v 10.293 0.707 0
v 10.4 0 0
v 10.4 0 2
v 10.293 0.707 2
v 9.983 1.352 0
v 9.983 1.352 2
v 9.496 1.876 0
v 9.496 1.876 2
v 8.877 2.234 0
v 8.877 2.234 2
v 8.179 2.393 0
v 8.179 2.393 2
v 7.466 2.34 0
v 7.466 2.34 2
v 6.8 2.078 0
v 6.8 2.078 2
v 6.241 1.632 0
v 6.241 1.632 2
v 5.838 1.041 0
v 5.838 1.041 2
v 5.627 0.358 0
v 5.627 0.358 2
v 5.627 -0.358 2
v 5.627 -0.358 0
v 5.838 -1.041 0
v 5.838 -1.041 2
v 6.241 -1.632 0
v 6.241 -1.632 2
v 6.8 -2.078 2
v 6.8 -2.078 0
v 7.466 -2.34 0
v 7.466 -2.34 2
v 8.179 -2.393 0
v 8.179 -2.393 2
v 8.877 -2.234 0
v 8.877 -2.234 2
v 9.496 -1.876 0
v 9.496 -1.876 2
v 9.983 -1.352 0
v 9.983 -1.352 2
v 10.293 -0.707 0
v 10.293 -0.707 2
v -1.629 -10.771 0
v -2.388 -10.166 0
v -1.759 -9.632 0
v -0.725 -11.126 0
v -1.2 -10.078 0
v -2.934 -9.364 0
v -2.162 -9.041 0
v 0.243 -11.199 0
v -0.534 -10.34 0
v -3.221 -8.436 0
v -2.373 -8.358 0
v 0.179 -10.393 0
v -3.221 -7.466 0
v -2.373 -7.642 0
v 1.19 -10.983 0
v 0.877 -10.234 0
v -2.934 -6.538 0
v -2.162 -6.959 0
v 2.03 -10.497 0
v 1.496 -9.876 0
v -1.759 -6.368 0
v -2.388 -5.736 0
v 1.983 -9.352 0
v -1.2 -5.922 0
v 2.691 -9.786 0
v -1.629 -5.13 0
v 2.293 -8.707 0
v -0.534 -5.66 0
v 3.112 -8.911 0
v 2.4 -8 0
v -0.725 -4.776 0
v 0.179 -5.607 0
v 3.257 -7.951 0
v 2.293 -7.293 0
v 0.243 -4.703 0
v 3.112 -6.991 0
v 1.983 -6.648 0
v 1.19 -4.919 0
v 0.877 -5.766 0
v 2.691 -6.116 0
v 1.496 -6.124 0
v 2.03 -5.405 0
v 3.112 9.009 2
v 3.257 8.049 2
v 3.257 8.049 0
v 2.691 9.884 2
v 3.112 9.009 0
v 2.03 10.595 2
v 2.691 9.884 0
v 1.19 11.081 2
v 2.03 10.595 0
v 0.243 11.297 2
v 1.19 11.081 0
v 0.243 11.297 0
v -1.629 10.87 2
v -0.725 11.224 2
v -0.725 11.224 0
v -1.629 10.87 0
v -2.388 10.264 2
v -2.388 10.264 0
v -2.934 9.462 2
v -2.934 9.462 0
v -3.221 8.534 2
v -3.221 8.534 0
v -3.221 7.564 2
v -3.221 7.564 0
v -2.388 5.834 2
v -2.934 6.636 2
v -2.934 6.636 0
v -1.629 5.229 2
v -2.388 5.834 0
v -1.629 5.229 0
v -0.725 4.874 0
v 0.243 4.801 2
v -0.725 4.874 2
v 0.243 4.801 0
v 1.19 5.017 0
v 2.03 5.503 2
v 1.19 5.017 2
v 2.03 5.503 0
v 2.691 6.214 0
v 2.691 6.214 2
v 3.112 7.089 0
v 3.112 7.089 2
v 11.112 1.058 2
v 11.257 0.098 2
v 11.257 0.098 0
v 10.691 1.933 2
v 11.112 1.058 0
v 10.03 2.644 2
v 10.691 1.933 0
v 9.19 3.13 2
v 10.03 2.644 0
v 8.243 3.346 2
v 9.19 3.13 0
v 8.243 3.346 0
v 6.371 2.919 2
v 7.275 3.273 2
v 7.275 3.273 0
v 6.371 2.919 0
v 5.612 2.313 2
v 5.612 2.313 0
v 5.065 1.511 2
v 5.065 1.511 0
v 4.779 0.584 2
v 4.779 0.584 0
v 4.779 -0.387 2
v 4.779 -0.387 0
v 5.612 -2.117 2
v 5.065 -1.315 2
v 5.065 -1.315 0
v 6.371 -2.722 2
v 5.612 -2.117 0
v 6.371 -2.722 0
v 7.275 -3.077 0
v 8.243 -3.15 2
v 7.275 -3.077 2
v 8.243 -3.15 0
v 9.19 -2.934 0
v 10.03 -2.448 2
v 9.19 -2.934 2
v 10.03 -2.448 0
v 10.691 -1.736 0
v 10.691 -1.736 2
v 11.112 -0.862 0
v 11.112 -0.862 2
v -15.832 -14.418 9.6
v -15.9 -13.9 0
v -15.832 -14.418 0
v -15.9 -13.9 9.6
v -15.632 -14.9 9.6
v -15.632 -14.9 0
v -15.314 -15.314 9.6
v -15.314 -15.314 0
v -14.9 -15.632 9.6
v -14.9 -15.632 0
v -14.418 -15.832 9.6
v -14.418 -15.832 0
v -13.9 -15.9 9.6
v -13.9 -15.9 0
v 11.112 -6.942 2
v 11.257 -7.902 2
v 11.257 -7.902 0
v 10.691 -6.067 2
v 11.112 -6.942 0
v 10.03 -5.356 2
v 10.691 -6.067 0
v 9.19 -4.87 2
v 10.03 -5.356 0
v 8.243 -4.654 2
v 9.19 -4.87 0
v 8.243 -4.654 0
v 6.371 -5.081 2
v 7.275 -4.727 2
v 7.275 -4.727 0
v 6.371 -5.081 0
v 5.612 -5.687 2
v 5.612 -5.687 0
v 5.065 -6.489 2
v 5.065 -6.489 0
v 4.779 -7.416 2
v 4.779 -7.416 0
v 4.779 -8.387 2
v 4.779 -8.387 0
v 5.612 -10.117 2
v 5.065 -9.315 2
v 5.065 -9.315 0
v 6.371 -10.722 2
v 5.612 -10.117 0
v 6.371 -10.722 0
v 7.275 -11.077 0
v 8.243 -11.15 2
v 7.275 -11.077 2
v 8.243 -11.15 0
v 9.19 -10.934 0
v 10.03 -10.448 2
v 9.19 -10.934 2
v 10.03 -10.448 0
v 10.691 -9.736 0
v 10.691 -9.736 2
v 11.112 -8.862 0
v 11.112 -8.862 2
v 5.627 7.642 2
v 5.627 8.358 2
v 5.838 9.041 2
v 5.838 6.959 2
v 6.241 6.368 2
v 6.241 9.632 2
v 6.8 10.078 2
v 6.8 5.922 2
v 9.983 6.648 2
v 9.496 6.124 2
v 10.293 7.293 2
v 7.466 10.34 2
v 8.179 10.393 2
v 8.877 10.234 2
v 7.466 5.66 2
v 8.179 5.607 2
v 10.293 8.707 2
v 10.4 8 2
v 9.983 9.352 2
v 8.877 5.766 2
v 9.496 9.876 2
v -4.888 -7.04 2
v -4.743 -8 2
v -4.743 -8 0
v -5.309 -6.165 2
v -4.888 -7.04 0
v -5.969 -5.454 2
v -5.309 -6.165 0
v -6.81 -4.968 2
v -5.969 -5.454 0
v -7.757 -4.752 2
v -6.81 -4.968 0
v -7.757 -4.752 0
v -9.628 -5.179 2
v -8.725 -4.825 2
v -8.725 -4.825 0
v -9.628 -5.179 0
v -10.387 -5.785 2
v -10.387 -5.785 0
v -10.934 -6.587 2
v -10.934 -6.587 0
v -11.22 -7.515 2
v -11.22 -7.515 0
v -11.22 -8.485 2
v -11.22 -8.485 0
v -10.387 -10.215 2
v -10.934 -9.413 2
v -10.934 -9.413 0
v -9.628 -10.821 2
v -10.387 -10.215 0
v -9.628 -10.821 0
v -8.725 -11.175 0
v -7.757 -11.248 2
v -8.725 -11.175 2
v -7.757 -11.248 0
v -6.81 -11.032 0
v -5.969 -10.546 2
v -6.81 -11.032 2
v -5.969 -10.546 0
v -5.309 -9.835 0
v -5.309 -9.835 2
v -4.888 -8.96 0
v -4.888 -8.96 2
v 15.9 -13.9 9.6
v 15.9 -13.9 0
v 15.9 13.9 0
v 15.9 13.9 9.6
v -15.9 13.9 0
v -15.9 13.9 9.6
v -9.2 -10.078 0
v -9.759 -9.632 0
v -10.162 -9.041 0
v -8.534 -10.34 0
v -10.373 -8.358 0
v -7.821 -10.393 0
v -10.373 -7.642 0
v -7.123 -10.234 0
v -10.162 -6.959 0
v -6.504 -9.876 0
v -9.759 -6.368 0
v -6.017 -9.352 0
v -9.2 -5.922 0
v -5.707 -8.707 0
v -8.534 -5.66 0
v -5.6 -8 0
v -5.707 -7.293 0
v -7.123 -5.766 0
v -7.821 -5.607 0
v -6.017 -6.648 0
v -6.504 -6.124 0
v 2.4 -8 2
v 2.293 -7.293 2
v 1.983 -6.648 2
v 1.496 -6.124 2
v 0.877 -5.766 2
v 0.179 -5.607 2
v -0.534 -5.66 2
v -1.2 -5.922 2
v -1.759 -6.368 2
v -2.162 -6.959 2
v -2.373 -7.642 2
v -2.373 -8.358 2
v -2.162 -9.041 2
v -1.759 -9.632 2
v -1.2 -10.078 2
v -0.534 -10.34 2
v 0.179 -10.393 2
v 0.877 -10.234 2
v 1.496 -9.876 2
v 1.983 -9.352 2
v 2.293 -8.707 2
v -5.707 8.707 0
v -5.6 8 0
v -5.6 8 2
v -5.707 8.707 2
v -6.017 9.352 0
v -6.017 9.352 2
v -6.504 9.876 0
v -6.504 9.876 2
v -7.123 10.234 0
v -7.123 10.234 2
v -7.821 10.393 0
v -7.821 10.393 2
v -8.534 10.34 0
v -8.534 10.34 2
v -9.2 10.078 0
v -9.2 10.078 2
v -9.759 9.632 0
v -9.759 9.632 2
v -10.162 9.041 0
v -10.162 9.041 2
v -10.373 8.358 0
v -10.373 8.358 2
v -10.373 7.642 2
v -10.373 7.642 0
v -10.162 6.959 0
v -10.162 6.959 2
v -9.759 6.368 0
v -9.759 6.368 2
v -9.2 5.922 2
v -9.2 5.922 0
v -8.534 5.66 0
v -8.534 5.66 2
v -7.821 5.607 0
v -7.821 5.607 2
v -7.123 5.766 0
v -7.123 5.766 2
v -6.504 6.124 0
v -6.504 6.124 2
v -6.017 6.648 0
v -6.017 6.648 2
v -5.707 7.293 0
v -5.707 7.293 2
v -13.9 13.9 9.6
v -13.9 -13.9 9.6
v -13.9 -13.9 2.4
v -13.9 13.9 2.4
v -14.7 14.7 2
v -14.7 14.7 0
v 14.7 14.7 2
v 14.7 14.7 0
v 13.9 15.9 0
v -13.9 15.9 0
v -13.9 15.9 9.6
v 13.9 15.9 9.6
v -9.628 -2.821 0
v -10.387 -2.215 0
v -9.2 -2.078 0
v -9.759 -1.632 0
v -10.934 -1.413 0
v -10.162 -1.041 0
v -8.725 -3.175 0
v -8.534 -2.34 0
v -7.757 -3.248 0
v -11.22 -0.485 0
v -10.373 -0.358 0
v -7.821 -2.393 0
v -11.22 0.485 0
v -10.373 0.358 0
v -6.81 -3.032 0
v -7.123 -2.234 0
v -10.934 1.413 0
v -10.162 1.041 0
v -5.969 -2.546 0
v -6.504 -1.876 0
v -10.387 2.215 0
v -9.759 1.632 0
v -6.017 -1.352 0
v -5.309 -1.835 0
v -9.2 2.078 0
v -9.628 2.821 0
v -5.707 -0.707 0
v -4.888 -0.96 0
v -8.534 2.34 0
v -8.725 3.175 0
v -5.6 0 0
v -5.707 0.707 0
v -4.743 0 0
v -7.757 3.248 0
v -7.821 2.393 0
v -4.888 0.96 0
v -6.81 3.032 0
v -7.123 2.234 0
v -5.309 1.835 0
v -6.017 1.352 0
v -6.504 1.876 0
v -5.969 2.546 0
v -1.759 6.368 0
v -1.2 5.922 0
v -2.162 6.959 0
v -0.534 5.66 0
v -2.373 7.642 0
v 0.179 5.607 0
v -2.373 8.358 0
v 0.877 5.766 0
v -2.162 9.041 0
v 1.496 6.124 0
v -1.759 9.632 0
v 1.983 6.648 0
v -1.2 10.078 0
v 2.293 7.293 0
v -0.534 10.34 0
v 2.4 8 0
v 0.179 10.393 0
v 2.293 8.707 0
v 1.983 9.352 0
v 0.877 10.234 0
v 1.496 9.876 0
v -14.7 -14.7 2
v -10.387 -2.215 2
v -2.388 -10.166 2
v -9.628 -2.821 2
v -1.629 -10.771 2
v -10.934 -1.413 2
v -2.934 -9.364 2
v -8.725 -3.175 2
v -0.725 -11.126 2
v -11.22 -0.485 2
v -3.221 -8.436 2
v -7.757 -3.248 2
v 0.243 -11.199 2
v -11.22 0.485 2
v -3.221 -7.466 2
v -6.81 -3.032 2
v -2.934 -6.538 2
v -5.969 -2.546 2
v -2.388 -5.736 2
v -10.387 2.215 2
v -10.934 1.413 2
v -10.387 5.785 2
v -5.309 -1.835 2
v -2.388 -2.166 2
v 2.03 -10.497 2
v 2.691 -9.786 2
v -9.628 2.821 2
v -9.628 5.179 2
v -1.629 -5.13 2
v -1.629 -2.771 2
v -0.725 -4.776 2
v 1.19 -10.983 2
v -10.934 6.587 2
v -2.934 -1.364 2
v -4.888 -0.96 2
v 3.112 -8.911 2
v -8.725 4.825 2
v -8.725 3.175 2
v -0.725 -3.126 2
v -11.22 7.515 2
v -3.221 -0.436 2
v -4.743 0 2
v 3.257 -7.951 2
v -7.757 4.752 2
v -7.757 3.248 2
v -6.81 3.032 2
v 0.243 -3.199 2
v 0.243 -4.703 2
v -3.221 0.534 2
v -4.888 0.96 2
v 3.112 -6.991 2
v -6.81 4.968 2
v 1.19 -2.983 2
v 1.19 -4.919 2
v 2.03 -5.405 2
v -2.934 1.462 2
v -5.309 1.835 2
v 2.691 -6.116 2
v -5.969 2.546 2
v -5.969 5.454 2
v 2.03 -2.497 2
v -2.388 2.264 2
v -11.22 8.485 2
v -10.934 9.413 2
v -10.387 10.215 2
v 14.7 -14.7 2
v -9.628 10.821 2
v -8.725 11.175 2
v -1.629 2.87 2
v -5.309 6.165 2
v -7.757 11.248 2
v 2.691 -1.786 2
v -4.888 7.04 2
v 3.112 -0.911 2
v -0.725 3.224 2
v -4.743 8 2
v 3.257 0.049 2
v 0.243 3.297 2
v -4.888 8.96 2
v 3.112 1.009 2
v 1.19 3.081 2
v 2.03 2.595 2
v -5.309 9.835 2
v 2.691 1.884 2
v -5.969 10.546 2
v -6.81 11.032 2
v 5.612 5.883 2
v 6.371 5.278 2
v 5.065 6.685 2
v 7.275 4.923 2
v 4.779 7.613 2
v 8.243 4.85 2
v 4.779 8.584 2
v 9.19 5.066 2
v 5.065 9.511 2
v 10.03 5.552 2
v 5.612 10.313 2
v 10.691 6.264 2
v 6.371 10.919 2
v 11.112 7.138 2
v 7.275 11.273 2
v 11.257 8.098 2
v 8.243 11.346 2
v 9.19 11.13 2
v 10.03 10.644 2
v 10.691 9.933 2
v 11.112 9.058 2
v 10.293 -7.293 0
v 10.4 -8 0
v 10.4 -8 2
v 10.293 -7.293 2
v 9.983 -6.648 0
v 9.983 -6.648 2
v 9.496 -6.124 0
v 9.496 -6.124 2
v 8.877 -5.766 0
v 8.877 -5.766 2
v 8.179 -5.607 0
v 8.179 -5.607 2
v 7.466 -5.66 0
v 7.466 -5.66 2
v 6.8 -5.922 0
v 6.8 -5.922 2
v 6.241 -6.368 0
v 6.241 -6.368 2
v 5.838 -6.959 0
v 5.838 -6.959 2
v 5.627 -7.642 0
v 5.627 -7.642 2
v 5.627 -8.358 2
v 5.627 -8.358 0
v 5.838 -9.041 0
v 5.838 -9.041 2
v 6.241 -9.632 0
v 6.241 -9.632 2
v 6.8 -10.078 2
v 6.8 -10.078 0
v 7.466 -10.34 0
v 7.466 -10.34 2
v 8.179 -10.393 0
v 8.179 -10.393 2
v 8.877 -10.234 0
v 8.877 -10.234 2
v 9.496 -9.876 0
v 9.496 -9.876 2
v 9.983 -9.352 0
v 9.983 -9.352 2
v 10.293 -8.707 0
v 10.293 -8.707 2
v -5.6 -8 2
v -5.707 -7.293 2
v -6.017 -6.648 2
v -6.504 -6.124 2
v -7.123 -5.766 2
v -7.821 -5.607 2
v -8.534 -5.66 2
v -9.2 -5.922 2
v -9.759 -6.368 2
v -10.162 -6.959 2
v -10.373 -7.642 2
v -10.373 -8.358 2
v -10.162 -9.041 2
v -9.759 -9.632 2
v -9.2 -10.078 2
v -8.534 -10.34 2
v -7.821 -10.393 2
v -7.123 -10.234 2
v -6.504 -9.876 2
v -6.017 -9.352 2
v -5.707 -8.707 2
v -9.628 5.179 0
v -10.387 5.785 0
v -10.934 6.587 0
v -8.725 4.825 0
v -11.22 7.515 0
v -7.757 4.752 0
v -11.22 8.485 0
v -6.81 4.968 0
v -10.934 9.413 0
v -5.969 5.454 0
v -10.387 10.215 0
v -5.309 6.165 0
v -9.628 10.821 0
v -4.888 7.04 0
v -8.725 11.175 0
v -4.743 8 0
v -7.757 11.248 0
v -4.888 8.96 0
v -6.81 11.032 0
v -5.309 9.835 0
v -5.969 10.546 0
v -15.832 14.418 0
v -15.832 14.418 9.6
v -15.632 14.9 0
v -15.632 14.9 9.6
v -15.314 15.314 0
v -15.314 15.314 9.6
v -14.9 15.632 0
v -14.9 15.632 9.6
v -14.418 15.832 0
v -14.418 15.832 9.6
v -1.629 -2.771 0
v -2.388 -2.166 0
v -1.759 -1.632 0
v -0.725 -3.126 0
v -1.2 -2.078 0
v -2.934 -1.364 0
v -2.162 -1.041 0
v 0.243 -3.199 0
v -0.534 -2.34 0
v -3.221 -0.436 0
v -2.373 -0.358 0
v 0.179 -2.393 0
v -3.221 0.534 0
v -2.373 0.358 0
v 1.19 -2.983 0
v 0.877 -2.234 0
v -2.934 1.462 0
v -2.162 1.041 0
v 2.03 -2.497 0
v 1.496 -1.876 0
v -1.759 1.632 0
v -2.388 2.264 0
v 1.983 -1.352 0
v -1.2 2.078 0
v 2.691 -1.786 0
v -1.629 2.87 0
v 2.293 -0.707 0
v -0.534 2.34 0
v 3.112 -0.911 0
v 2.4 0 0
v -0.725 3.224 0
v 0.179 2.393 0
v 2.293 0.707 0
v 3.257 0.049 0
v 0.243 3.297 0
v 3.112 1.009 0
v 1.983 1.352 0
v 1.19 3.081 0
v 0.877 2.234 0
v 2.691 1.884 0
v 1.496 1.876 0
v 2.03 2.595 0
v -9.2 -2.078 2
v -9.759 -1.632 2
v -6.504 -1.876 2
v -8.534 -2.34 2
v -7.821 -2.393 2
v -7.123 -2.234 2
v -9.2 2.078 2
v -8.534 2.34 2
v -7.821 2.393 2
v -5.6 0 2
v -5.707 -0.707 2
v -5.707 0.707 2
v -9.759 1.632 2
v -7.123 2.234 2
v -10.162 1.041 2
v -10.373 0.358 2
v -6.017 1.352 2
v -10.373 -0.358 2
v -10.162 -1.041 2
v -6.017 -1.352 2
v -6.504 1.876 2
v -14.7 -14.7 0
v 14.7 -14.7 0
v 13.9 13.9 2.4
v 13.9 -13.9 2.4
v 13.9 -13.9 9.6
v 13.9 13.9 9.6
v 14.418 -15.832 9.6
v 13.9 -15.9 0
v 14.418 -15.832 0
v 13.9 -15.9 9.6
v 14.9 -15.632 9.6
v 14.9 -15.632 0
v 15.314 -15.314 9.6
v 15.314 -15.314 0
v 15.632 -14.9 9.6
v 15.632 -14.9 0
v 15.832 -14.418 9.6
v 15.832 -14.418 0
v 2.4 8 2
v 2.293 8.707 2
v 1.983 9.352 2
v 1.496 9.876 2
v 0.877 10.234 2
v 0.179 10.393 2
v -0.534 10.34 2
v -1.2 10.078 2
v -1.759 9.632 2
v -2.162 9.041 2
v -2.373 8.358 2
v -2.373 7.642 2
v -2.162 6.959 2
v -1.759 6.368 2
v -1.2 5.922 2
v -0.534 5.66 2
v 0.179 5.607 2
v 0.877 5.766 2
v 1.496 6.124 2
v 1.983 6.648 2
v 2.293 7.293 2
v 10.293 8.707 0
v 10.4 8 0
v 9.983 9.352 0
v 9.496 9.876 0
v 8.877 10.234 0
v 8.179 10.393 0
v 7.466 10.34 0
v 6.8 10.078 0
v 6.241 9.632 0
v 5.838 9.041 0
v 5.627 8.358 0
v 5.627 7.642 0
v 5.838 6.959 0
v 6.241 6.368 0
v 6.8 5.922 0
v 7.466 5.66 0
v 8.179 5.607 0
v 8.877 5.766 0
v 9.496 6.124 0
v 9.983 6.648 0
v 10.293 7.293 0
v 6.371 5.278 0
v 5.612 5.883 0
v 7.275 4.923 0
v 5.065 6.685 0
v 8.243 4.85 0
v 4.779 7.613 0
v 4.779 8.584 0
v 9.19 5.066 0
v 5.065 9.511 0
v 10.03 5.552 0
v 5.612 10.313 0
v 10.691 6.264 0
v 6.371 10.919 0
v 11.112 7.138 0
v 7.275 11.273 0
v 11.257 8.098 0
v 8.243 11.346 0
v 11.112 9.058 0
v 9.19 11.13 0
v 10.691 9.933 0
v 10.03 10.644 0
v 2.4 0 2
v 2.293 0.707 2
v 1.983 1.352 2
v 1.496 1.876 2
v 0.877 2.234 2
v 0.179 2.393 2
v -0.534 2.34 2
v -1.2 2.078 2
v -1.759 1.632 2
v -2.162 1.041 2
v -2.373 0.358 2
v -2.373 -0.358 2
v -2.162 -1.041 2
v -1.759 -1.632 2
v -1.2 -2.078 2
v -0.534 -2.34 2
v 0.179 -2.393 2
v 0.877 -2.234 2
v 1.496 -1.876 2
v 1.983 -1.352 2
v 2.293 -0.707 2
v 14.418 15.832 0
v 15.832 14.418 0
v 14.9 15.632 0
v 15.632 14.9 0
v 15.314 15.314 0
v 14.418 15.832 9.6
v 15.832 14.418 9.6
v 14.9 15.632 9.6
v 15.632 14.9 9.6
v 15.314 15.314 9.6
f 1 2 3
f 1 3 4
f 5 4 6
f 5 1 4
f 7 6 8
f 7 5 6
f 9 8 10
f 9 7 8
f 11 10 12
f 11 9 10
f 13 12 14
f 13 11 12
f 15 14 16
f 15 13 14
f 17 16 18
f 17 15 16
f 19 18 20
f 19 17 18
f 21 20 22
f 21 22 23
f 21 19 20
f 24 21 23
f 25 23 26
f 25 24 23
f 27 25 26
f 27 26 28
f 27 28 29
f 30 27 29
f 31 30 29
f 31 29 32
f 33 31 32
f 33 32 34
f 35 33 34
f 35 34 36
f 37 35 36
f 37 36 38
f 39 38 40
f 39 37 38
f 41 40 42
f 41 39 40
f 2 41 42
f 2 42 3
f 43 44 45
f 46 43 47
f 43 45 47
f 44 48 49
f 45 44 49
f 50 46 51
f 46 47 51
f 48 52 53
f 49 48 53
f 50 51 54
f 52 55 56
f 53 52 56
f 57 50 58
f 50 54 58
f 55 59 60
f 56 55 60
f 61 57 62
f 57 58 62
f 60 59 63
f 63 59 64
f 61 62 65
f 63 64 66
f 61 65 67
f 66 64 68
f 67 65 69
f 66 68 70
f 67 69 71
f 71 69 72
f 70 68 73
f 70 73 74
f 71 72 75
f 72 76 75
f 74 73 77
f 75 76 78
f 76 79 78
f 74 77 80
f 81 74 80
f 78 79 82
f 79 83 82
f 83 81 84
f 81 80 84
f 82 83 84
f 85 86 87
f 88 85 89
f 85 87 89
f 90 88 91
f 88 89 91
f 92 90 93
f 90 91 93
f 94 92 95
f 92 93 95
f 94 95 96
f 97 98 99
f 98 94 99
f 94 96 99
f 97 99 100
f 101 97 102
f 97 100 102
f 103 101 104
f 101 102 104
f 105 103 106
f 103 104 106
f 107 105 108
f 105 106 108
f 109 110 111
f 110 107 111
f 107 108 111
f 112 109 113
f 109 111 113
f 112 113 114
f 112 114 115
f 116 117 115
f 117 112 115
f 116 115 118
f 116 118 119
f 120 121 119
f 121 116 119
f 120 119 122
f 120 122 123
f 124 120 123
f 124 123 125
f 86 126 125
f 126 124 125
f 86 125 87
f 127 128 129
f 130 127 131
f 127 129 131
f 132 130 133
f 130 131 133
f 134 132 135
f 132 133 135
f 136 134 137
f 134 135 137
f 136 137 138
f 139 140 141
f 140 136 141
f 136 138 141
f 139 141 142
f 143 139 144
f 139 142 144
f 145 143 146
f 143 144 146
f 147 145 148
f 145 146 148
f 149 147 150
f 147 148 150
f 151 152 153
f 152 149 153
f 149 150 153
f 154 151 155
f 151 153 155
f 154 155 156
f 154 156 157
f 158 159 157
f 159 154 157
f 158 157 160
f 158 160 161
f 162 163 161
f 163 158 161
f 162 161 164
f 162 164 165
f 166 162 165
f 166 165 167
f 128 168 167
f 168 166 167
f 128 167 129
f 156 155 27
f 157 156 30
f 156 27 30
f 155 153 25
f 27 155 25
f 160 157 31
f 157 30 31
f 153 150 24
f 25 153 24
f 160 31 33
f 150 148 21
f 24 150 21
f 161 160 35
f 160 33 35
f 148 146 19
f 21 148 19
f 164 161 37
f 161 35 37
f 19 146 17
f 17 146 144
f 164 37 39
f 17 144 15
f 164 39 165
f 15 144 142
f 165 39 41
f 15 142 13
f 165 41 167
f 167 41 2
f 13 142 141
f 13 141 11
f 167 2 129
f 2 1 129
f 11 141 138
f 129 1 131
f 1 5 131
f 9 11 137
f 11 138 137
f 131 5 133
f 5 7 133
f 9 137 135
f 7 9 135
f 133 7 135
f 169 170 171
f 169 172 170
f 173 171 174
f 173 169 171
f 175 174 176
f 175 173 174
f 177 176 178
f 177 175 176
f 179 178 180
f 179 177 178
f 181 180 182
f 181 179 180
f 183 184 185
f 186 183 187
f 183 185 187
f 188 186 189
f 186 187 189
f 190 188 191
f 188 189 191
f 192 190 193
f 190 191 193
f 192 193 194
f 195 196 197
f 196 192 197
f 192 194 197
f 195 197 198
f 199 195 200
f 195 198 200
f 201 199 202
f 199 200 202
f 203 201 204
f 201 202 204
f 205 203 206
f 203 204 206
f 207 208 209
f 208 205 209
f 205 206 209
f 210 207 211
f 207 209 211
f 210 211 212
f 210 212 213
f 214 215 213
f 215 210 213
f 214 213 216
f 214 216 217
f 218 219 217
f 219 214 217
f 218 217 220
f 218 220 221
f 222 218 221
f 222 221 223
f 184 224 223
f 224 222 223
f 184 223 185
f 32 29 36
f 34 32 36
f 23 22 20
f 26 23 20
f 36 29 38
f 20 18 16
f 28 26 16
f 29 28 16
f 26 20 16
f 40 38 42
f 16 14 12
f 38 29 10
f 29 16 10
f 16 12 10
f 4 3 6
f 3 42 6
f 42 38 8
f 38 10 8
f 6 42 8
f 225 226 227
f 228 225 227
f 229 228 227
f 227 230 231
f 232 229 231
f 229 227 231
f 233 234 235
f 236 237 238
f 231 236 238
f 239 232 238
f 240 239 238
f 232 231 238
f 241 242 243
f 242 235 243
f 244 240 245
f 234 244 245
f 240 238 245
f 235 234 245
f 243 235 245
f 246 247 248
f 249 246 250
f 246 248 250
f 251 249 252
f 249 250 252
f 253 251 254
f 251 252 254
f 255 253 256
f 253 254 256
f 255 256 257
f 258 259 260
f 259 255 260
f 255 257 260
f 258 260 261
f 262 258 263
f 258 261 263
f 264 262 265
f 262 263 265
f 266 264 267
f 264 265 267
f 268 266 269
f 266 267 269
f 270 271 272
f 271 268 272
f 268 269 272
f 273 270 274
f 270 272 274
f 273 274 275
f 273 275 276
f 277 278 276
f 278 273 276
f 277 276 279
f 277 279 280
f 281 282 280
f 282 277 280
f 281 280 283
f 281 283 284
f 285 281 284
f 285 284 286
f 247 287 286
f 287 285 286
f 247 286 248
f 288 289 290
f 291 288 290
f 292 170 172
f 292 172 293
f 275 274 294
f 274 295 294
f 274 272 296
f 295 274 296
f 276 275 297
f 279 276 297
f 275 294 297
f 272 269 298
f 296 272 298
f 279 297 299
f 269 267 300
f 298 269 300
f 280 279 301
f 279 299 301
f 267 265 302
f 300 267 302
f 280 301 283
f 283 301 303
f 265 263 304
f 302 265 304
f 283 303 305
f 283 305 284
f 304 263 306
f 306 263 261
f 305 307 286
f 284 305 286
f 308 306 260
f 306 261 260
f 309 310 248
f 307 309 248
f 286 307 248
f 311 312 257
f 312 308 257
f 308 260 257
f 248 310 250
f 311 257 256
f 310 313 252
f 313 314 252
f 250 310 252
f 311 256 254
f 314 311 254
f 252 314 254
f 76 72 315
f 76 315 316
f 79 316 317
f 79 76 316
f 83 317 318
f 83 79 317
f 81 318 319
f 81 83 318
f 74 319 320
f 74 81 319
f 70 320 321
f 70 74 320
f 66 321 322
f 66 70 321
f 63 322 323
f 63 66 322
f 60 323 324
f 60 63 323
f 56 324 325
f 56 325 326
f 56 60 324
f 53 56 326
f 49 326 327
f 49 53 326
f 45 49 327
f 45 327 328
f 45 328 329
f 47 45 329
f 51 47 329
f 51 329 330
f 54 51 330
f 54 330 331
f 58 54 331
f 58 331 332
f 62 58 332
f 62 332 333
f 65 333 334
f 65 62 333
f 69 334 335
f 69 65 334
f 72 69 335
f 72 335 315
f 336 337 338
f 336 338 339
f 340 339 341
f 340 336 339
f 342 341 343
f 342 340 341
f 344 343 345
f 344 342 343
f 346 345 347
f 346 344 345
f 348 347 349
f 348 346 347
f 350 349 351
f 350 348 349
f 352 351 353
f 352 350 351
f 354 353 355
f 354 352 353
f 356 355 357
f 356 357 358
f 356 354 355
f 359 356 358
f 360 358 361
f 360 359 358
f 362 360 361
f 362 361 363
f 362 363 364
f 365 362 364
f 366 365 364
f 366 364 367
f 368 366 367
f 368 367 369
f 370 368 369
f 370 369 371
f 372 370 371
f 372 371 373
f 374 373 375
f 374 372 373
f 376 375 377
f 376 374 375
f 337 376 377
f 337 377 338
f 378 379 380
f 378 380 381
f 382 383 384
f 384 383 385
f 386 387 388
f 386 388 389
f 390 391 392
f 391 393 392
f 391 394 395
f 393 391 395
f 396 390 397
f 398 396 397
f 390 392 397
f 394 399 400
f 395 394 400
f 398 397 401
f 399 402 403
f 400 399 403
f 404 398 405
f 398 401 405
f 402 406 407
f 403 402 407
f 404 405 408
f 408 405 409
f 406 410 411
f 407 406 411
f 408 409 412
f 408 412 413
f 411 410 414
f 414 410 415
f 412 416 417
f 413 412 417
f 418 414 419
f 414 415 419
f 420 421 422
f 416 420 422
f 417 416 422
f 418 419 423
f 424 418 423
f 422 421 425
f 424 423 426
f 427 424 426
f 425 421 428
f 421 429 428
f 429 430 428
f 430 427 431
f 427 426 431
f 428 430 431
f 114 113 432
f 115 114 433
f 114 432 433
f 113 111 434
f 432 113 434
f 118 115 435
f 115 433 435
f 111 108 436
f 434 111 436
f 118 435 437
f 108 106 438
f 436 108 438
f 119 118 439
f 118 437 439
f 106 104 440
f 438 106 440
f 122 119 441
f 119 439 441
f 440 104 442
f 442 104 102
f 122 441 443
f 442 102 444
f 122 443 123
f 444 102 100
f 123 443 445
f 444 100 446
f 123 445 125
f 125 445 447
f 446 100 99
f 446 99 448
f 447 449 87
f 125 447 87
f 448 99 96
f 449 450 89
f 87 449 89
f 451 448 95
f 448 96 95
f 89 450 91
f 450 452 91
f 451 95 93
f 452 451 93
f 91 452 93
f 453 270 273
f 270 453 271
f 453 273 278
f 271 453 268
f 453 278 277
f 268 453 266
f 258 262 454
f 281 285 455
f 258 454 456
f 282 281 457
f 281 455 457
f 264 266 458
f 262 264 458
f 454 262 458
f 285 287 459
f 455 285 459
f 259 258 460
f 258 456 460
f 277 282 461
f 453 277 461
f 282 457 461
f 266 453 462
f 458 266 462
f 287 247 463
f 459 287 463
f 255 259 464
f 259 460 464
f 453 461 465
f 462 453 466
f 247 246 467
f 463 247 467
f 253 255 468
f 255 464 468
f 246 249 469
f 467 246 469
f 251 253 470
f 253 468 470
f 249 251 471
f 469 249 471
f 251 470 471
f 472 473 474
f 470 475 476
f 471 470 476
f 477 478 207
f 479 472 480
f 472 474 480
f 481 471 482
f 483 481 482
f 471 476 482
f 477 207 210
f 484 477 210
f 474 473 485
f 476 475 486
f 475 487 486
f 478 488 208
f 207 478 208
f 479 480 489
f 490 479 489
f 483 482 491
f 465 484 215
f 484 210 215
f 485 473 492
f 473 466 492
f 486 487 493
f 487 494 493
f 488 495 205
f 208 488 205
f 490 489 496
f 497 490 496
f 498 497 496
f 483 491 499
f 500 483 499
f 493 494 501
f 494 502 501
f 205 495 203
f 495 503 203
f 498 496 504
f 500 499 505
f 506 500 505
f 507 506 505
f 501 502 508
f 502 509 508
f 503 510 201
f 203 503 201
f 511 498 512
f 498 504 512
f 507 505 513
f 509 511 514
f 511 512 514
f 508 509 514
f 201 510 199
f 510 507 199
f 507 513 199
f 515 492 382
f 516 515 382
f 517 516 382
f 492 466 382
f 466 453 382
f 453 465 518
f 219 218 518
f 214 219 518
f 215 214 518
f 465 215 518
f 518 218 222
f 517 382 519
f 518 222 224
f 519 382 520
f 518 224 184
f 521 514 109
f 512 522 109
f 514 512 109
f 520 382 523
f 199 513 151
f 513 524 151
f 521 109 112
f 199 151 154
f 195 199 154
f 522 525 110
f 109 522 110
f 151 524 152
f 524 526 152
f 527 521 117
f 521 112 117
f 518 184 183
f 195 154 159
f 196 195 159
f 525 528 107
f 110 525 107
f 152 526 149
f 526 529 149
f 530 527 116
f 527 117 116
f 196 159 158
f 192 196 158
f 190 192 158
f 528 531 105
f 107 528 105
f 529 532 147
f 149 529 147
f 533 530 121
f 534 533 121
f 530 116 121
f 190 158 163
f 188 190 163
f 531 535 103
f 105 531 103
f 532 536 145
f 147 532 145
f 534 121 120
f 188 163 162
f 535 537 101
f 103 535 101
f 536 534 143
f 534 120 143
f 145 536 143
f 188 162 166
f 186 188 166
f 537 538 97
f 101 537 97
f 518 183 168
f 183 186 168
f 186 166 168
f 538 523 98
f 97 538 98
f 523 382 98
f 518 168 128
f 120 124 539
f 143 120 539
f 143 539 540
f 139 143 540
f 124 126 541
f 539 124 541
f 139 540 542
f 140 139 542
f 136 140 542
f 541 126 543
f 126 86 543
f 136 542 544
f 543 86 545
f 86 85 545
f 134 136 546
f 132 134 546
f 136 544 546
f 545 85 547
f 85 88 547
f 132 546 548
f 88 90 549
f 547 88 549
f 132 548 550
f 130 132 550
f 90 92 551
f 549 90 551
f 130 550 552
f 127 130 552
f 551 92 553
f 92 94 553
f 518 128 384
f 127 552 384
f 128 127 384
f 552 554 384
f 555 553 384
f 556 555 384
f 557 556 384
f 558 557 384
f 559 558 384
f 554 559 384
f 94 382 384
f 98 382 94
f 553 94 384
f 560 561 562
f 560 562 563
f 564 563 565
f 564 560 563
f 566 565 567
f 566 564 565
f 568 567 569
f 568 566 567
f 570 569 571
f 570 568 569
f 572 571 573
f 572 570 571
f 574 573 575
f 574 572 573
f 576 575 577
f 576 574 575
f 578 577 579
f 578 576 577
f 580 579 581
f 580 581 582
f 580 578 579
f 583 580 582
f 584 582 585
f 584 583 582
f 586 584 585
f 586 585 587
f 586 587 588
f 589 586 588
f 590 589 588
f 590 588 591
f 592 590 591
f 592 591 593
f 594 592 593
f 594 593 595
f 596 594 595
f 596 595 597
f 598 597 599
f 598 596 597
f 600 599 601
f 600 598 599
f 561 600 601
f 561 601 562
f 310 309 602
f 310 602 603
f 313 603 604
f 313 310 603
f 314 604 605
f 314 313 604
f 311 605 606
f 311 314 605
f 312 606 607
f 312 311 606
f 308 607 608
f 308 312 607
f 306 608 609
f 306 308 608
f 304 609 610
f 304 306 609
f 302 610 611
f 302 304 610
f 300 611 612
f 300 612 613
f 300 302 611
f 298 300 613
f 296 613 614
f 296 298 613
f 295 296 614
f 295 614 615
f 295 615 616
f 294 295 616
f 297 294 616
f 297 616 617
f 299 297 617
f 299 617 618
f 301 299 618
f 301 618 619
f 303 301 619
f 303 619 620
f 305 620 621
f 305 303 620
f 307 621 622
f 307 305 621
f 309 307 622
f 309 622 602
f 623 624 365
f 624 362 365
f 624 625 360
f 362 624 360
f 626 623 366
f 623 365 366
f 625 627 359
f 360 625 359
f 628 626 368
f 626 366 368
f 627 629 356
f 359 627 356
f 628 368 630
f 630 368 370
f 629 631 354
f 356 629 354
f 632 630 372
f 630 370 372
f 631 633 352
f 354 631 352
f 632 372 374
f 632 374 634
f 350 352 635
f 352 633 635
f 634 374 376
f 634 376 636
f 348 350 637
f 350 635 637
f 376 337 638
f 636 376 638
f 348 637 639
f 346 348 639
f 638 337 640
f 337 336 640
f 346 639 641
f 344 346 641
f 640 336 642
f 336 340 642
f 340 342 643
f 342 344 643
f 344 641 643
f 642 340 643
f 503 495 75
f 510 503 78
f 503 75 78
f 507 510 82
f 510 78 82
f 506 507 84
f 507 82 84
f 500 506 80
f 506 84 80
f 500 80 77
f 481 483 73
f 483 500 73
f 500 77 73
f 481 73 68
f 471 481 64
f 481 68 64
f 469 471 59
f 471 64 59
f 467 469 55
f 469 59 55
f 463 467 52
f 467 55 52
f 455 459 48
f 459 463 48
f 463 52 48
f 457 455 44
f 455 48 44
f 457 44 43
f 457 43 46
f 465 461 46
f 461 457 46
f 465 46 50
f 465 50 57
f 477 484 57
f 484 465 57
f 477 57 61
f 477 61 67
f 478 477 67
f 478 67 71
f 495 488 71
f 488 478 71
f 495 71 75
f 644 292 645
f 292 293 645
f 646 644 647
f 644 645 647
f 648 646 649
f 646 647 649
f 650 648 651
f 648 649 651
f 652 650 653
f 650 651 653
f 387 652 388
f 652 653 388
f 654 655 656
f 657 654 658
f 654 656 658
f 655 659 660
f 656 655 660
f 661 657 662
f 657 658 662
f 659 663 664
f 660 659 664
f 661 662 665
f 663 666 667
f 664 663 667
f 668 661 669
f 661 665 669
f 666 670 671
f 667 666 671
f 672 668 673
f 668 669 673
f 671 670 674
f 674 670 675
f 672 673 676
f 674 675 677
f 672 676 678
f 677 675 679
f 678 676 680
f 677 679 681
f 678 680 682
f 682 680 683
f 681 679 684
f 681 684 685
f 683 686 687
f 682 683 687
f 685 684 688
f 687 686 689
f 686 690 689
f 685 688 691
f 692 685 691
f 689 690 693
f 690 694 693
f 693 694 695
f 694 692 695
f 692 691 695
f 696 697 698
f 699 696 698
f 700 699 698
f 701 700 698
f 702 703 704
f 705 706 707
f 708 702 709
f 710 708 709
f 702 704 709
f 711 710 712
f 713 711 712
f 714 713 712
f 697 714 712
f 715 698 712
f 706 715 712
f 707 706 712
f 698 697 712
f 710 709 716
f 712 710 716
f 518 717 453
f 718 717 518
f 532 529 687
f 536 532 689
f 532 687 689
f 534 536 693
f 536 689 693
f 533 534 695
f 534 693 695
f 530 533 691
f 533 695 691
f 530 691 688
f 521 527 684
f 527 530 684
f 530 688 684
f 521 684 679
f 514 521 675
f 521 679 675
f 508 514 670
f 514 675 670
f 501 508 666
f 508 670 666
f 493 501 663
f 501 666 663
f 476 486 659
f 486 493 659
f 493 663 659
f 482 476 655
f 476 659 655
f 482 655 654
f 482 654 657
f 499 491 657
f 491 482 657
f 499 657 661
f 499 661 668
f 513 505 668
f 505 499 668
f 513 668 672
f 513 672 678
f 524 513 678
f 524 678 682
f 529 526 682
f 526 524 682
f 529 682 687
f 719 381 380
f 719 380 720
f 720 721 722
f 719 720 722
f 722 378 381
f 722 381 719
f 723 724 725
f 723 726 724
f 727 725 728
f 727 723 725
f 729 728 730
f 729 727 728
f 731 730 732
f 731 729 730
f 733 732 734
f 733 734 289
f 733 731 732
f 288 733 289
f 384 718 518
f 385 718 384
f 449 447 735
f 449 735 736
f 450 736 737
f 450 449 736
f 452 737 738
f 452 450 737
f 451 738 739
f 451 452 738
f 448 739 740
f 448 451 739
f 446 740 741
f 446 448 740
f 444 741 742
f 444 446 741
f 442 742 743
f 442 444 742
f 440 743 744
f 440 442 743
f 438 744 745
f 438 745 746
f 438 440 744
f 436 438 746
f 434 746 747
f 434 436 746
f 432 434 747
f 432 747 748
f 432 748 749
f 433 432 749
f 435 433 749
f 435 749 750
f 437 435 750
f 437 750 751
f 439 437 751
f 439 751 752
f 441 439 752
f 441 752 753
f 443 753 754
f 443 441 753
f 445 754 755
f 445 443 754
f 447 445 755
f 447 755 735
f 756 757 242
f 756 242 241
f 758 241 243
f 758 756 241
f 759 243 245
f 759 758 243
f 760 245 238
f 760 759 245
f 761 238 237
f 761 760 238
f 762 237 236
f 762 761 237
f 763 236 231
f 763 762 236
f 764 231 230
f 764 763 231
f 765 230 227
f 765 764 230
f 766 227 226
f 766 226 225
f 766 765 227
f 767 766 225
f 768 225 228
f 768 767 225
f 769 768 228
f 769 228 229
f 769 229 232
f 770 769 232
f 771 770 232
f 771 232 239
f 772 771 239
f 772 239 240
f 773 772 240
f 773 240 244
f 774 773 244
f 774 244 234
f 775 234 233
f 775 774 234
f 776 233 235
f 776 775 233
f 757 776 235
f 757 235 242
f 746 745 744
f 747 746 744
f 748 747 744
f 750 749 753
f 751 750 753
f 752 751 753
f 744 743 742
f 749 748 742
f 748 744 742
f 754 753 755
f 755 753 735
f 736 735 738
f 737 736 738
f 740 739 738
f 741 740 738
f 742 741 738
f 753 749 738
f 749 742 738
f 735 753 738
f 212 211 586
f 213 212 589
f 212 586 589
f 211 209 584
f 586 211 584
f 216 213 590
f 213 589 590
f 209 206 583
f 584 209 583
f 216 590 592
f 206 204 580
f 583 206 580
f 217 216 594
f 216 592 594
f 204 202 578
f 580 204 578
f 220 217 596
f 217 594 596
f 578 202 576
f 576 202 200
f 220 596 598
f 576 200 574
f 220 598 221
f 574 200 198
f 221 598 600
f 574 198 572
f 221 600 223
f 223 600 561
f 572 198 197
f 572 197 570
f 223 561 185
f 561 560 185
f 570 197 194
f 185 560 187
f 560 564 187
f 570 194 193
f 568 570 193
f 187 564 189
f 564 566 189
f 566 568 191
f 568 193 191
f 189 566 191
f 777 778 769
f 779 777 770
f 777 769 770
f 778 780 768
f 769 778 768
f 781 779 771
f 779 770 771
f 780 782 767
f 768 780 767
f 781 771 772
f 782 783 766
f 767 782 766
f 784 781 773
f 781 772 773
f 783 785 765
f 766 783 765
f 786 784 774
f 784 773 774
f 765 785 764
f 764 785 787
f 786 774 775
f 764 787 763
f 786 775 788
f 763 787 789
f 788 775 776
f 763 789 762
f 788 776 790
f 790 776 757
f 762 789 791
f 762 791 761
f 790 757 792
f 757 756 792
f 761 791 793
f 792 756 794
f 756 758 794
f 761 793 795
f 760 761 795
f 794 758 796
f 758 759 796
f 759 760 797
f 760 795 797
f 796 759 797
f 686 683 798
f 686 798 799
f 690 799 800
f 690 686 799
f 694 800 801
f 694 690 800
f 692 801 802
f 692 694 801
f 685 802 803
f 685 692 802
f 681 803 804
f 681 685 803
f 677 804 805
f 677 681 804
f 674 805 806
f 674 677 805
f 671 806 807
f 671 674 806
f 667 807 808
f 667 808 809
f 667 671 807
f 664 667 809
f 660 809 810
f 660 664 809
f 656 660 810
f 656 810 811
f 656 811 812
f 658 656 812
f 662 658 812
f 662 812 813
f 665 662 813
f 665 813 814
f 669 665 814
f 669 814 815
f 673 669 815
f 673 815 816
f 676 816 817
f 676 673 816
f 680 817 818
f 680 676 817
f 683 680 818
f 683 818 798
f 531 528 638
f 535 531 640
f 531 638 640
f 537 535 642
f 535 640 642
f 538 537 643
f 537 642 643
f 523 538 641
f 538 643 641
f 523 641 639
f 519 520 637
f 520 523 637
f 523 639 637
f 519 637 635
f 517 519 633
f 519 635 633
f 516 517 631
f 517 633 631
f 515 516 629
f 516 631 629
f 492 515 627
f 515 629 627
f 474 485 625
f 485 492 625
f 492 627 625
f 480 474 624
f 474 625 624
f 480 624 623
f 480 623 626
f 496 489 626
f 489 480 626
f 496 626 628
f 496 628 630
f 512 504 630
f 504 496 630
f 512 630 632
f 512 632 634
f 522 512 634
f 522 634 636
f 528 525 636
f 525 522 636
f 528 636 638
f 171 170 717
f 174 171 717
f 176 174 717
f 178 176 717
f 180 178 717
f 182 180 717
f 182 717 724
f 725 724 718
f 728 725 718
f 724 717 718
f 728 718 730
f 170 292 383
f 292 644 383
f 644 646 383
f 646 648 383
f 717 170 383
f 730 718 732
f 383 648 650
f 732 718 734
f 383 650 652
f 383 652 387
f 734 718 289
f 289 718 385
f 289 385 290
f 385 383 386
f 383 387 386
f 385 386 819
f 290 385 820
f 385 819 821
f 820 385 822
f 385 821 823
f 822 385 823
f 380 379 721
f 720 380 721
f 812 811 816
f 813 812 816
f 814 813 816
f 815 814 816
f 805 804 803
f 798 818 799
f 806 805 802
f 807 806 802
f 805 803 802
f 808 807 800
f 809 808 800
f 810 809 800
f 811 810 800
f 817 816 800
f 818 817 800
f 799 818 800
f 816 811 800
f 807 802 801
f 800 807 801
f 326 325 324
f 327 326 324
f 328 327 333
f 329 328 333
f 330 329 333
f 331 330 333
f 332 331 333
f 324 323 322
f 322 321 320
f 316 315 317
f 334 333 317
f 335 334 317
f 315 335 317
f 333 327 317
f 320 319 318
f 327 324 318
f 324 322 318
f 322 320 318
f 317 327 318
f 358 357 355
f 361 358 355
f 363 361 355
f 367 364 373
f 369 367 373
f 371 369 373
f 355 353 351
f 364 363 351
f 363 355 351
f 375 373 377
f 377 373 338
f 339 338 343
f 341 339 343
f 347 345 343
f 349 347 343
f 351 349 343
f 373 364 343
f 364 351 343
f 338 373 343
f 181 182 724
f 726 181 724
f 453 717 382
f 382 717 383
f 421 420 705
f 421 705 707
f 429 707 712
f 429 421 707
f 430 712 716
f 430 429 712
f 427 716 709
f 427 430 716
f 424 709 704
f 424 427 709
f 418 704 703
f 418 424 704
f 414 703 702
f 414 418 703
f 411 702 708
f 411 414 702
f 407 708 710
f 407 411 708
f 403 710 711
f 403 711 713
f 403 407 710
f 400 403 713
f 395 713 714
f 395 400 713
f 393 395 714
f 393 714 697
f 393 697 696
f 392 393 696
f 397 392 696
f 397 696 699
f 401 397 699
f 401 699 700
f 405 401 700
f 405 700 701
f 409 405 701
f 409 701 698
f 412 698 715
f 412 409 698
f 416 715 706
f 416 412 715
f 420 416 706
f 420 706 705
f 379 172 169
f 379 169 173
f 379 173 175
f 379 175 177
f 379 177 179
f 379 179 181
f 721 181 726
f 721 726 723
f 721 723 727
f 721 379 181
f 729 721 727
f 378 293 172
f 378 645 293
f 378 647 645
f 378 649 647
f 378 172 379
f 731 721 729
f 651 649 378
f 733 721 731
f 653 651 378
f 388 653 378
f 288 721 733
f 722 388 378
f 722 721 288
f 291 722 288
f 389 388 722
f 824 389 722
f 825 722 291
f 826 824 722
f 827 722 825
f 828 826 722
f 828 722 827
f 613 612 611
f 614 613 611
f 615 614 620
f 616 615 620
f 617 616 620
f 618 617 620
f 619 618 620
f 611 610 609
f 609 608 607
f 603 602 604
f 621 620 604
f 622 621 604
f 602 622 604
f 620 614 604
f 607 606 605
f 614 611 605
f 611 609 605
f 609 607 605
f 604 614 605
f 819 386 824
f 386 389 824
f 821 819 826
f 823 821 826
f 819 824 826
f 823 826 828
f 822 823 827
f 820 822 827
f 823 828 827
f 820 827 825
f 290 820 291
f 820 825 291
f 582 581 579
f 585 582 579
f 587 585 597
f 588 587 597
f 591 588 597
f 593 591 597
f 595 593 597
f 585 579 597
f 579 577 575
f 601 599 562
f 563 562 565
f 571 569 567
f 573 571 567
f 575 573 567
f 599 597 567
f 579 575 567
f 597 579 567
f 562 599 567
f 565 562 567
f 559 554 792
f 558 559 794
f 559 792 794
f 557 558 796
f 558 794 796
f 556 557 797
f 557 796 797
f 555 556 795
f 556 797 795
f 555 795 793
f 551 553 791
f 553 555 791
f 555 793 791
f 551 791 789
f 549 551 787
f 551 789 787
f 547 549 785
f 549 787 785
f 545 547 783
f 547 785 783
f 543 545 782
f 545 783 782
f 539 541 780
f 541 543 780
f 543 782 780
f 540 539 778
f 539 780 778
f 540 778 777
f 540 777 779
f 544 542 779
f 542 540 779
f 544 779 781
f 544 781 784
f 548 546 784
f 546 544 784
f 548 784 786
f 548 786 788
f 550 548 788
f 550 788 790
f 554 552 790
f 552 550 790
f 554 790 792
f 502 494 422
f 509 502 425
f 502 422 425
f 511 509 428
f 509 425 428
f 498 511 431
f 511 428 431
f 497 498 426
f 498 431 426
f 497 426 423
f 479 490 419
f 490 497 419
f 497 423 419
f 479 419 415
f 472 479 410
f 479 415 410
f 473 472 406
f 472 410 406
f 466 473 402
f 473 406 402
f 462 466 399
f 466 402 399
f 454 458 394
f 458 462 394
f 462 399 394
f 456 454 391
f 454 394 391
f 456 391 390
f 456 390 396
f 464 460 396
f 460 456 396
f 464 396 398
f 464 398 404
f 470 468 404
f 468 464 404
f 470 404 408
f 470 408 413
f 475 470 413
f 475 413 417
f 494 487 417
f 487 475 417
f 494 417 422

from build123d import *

# Parameters (mm, degrees)
F0_W      = 31.8
F0_H      = 31.8
F1_DEPTH  = 9.6
F2_W      = 29.4
F2_H      = 29.4
F3_DEPTH  = 2
F4_R      = 2
F6_W      = 27.8
F6_H      = 27.8
F7_DEPTH  = 7.2
F8_R      = 3.25685
F10_DEPTH = 2.4
F9_R      = 2.4
F11_DEPTH = 2


with BuildPart() as f1:
    # F0 (on Top) → F1 (new body)
    with BuildSketch(Plane.XY):
        Rectangle(F0_W, F0_H)
    extrude(amount=F1_DEPTH)

    # F2 (on Top) → F3 (cut)
    with BuildSketch(Plane.XY):
        Rectangle(F2_W, F2_H)
    extrude(amount=F3_DEPTH, mode=Mode.SUBTRACT)

    # F4
    f4_edges = [f1.edges().sort_by_distance(p)[0] for p in [
        (-15.9, -15.9, 4.8),
        (-15.9, 15.9, 4.8),
        (15.9, 15.9, 4.8),
        (15.9, -15.9, 4.8),
    ]]
    fillet(f4_edges, radius=F4_R)

    # F6 (on offset) → F7 (cut)
    with BuildSketch(Plane.XY.offset(9.6)):
        Rectangle(F6_W, F6_H)
    extrude(amount=-F7_DEPTH, mode=Mode.SUBTRACT)

    # F8 (on Top) → F10 (join)
    with BuildSketch(Plane.XY):
        with Locations((-8, -8)):
            Circle(F8_R)
        with Locations((-8, 0)):
            Circle(F8_R)
        with Locations((-8, 8)):
            Circle(F8_R)
        with Locations((-0.000151, -7.950921)):
            Circle(F8_R)
        with Locations((-0.000151, 0.049079)):
            Circle(F8_R)
        with Locations((-0.000151, 8.049079)):
            Circle(F8_R)
        with Locations((7.999699, -7.901842)):
            Circle(F8_R)
        with Locations((7.999699, 0.098158)):
            Circle(F8_R)
        with Locations((7.999699, 8.098158)):
            Circle(F8_R)
    extrude(amount=F10_DEPTH)

    # F9 (on Top) → F11 (cut)
    with BuildSketch(Plane.XY):
        with Locations((-8, -8)):
            Circle(F9_R)
        with Locations((-8, 0)):
            Circle(F9_R)
        with Locations((-8, 8)):
            Circle(F9_R)
        with Locations((0, -8)):
            Circle(F9_R)
        Circle(F9_R)
        with Locations((0, 8)):
            Circle(F9_R)
        with Locations((8, -8)):
            Circle(F9_R)
        with Locations((8, 0)):
            Circle(F9_R)
        with Locations((8, 8)):
            Circle(F9_R)
    extrude(amount=F11_DEPTH, mode=Mode.SUBTRACT)


solid = f1.part
